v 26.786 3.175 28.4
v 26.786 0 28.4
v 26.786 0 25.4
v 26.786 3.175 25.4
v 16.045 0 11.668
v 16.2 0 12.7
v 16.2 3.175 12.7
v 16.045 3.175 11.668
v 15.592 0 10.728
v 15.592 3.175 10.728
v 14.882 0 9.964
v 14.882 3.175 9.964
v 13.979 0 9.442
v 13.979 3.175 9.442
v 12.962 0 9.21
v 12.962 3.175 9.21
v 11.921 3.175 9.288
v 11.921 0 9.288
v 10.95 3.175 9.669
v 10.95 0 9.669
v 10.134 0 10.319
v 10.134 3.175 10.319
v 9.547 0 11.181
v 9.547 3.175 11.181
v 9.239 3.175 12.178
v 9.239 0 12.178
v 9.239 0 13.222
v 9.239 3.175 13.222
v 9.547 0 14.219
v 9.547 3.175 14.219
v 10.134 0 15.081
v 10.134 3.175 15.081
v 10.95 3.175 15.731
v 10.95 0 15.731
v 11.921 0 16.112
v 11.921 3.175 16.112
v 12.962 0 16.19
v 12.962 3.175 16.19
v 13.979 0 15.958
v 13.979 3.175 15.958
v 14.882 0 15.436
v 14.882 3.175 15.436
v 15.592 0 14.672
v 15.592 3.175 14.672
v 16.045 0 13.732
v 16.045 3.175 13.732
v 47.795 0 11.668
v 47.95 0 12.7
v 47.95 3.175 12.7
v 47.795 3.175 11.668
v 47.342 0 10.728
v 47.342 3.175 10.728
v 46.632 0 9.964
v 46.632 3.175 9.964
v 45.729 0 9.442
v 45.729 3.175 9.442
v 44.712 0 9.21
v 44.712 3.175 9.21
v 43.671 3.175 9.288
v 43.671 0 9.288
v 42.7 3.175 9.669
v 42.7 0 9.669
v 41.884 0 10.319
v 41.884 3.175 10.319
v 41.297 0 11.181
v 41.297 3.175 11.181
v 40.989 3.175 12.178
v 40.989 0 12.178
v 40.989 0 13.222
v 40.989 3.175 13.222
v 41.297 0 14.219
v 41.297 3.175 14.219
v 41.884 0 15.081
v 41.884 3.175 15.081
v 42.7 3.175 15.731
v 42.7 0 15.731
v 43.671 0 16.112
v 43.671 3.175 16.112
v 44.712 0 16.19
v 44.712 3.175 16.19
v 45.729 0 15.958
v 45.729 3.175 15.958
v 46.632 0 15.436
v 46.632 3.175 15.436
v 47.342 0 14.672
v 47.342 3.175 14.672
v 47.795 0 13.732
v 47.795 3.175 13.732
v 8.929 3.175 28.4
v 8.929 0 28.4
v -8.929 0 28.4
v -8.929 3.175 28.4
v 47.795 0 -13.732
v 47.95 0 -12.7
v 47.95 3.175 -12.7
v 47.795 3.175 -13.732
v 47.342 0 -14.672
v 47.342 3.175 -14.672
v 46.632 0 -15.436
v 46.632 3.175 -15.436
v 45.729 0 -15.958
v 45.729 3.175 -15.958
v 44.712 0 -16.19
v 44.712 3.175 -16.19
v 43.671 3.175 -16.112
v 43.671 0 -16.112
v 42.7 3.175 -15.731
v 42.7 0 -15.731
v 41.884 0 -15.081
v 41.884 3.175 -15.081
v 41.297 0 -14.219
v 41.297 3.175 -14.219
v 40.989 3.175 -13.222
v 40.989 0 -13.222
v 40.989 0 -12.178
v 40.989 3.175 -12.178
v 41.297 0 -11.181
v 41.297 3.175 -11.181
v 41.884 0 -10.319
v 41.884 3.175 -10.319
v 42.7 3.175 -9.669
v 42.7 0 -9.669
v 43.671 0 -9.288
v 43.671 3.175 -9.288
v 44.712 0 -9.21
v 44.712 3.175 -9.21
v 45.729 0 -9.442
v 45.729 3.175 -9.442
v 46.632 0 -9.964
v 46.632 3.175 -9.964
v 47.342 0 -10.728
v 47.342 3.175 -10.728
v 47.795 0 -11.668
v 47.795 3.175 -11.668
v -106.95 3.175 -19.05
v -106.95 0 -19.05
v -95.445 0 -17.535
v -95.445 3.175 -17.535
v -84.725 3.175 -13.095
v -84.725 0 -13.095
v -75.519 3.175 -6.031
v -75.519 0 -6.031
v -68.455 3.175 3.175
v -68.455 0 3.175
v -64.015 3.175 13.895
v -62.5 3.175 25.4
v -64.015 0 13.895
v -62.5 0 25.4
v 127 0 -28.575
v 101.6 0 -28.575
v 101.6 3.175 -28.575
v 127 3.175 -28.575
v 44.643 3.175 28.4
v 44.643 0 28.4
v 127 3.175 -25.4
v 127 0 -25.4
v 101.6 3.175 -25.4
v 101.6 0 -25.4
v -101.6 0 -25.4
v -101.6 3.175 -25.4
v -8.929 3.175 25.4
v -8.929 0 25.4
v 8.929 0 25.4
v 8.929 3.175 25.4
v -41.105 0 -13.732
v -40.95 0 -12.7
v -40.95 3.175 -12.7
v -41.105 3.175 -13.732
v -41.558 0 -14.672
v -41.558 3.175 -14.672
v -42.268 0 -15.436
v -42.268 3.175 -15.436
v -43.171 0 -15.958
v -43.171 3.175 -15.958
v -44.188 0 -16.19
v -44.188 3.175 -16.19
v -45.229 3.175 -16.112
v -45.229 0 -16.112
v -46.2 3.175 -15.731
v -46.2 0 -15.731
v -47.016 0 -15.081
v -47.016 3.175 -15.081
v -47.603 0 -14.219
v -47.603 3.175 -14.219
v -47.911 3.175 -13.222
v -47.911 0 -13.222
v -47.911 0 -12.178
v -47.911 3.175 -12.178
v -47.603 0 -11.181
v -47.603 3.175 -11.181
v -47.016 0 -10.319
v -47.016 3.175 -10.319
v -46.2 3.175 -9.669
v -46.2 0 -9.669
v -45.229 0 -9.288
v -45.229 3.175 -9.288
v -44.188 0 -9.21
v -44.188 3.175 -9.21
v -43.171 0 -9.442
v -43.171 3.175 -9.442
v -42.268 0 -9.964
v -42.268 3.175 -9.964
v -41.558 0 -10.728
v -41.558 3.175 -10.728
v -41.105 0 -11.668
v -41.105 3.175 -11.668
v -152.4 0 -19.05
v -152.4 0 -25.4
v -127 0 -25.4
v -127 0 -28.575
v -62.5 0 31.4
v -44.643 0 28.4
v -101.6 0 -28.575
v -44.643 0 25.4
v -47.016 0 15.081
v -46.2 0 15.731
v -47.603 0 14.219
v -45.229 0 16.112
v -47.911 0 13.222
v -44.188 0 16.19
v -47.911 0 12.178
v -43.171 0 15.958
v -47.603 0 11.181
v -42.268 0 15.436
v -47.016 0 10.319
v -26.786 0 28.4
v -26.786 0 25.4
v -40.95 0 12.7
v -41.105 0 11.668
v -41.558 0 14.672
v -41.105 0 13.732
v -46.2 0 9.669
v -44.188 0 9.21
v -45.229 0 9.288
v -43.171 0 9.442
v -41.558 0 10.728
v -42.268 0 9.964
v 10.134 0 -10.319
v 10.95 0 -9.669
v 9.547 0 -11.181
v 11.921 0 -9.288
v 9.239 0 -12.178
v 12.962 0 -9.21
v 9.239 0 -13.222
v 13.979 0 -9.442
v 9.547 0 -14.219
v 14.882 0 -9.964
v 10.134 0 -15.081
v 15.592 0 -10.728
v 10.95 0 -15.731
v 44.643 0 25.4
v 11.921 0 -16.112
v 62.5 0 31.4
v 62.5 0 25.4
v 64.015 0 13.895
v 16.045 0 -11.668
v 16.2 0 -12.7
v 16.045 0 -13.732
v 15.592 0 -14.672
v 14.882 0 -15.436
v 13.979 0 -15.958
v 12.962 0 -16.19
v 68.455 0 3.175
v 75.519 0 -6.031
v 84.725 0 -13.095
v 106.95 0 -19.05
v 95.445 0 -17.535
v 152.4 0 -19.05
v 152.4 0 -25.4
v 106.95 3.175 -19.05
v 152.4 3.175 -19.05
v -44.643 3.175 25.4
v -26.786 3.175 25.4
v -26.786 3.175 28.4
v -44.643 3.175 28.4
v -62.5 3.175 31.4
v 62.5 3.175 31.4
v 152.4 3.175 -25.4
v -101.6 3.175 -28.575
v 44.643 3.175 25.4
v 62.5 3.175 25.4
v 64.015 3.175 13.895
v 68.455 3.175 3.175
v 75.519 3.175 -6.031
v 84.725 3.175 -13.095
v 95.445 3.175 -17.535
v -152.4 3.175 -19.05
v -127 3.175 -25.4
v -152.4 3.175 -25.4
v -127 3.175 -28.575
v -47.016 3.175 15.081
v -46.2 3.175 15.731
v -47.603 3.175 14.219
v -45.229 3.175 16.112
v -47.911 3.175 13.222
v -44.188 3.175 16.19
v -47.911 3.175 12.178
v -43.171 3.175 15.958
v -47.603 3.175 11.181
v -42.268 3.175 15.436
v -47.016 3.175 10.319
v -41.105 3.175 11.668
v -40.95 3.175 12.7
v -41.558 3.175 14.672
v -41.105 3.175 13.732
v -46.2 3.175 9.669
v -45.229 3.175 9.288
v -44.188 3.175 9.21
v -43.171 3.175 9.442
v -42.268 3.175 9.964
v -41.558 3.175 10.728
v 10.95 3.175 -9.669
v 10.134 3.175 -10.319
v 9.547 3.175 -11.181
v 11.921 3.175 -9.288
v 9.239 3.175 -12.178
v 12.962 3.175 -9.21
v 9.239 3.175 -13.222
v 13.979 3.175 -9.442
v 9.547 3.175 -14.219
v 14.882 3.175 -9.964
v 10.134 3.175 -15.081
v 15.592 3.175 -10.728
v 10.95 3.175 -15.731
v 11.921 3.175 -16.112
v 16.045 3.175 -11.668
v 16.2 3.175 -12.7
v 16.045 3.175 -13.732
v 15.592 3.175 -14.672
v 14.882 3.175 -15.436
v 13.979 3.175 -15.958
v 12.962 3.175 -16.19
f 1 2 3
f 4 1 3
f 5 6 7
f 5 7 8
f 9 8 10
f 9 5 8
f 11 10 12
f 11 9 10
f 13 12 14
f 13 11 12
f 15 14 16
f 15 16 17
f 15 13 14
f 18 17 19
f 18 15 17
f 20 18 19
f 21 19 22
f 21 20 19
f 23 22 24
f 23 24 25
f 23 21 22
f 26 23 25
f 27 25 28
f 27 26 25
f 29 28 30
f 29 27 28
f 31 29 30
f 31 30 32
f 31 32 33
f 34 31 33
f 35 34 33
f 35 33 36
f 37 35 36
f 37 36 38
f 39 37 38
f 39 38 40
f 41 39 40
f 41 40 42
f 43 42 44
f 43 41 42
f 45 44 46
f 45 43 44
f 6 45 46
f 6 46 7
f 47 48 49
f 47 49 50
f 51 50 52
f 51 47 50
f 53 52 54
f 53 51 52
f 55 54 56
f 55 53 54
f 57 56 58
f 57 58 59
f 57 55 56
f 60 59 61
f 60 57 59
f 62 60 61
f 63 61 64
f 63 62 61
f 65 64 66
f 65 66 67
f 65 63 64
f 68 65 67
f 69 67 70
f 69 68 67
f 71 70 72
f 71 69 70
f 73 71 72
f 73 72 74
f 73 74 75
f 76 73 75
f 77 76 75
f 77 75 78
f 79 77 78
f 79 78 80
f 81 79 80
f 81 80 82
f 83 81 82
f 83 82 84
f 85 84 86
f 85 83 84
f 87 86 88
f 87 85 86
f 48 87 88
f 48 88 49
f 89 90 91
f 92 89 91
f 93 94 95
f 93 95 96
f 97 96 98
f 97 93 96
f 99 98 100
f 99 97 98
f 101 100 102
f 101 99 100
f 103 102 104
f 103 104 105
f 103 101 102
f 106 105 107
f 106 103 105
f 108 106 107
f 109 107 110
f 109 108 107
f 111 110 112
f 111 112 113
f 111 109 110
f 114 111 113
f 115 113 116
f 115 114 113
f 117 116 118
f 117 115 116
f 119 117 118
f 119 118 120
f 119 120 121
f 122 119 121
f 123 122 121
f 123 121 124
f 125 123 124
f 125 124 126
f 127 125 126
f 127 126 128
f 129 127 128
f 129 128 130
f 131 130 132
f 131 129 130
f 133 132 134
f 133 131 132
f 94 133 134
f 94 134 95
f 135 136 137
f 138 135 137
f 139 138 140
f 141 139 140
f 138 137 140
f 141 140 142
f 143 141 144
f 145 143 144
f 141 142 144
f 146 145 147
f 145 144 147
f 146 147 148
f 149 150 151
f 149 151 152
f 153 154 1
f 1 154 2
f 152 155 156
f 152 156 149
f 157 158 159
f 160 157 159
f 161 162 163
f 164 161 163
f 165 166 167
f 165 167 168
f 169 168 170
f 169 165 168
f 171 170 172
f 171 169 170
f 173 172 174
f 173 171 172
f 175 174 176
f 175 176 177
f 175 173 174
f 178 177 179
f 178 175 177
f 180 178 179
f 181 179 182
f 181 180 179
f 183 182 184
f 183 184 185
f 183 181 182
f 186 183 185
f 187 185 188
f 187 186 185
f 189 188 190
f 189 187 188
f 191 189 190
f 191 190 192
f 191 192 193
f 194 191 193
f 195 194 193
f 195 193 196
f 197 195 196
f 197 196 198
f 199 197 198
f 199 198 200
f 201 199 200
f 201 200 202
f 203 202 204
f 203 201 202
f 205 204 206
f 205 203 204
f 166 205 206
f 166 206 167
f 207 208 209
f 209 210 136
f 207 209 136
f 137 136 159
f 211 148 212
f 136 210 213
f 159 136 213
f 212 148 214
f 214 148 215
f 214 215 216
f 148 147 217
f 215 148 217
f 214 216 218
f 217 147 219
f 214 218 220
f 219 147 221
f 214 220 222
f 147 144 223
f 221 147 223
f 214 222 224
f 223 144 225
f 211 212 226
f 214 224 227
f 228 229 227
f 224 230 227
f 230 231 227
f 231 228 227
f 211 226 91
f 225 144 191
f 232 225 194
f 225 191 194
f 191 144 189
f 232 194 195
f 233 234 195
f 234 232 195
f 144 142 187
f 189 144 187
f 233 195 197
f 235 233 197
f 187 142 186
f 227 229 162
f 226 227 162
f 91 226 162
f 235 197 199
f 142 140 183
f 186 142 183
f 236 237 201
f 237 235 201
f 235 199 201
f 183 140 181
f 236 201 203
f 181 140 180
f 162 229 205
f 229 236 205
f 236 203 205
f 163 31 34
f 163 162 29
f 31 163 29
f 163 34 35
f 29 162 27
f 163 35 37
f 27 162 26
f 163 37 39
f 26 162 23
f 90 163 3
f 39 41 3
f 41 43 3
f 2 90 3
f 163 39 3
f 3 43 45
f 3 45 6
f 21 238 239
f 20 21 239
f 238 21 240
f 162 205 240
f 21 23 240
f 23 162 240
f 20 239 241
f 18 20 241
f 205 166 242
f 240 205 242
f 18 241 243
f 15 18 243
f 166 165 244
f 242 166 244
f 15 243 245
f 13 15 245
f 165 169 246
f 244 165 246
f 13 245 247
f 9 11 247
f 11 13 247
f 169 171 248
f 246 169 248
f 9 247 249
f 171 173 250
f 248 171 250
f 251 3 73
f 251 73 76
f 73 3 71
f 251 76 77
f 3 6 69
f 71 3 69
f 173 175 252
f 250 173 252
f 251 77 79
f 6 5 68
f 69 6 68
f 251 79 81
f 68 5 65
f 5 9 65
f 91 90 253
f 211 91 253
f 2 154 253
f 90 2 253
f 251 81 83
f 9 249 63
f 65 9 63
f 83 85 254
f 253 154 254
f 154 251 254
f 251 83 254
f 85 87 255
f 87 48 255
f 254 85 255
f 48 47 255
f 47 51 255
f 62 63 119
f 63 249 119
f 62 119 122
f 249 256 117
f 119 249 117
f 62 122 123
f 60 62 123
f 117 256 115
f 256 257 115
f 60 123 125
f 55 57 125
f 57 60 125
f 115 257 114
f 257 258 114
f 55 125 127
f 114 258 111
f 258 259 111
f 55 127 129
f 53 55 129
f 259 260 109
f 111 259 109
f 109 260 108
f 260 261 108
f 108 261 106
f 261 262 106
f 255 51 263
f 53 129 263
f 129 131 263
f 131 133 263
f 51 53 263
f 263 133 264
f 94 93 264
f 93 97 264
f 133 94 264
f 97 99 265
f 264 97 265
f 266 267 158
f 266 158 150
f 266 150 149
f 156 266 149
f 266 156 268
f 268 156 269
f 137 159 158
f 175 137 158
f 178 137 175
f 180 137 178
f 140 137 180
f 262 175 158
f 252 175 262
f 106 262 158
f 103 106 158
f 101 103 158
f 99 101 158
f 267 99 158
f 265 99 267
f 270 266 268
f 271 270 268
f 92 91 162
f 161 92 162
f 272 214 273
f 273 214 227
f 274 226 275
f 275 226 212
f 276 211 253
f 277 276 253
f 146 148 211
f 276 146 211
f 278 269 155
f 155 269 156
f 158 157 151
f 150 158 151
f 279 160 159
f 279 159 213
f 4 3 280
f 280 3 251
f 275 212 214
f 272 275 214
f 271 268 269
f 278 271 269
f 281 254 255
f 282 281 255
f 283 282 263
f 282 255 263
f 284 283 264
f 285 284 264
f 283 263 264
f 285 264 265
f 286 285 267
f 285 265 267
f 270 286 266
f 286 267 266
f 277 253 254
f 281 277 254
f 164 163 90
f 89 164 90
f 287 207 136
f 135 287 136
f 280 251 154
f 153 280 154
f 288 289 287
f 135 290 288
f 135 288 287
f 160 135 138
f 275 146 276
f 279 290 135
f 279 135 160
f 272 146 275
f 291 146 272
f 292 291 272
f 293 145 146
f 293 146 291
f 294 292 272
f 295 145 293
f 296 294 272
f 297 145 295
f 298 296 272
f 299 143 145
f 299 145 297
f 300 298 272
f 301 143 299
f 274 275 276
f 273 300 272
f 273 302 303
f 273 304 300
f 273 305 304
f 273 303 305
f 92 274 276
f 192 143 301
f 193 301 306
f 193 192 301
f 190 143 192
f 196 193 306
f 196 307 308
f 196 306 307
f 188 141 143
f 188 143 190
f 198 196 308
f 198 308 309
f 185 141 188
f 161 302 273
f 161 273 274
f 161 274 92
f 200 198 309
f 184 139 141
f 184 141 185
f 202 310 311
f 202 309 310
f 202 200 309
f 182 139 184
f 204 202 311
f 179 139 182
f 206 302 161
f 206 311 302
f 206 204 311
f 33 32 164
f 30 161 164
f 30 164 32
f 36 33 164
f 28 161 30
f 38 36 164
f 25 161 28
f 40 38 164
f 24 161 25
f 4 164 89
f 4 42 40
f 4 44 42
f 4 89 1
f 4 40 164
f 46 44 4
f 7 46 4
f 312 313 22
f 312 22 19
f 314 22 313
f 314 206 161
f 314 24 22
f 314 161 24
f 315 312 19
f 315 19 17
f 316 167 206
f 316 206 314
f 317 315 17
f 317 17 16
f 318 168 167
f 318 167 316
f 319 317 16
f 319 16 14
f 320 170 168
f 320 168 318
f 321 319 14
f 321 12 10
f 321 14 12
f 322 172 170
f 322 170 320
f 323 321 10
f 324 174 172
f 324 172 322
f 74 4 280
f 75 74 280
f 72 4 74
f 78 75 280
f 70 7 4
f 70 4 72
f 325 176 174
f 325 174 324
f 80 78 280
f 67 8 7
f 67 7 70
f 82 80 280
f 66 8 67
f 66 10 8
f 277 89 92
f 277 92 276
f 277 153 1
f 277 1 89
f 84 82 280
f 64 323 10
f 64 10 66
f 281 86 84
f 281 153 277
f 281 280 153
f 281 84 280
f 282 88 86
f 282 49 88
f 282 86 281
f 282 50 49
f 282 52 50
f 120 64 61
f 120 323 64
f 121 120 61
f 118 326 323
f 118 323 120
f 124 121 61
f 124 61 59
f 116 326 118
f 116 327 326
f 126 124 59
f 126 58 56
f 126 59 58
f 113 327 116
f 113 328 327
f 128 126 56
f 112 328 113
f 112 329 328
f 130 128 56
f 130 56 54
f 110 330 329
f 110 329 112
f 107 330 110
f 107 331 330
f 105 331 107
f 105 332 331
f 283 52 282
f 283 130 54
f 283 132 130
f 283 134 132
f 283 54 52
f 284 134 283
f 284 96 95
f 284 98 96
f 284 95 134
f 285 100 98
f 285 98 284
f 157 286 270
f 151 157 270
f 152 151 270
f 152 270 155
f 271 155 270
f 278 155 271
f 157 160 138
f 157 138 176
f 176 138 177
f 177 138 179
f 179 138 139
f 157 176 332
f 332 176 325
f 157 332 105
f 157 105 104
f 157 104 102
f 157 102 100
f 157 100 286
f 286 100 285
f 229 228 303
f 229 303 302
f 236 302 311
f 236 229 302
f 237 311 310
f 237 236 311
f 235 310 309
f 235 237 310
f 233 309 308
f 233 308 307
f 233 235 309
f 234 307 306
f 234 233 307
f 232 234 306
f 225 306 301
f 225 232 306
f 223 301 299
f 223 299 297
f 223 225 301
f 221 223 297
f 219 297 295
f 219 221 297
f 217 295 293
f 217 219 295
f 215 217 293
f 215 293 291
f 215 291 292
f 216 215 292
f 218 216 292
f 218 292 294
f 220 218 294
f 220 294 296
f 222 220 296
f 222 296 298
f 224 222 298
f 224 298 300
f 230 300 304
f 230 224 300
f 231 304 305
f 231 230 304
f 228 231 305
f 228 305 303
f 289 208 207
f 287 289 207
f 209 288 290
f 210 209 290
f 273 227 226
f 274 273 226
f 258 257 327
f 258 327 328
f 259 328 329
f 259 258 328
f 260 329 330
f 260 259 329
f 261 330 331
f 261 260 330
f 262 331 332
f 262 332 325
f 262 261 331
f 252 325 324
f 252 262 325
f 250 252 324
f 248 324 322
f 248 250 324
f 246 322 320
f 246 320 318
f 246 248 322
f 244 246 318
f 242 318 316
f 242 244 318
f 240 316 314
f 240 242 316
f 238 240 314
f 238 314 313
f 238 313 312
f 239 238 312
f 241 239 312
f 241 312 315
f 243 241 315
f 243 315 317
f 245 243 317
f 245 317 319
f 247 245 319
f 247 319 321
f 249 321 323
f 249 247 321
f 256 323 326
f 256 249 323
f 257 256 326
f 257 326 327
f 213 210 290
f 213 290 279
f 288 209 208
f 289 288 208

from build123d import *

# Parameters (mm, degrees)
SKETCH1_R           = 3.5
SKETCH1_W           = 25.4
SKETCH1_H           = 3.175
BOSS_EXTRUDE1_DEPTH = 3.175


with BuildPart() as part:
    # Sketch1 → Boss-Extrude1 (new body)
    with BuildSketch(Plane(origin=(0, 0, 0), x_dir=(1, 0, 0), z_dir=(0, 1, 0))):
        with BuildLine():
            Line((-152.4, 19.05), (-106.95, 19.05))
            ThreePointArc((-106.95, 19.05), (-75.519103576, 6.030896424), (-62.5, -25.4))
            Line((-62.5, -25.4), (-44.642857143, -25.4))
            Line((-44.642857143, -25.4), (-26.785714286, -25.4))
            Line((-26.785714286, -25.4), (-8.928571429, -25.4))
            Line((-8.928571429, -25.4), (8.928571429, -25.4))
            Line((8.928571429, -25.4), (26.785714286, -25.4))
            Line((26.785714286, -25.4), (44.642857143, -25.4))
            Line((44.642857143, -25.4), (62.5, -25.4))
            ThreePointArc((62.5, -25.4), (75.519103576, 6.030896424), (106.95, 19.05))
            Line((106.95, 19.05), (152.4, 19.05))
            Line((152.4, 19.05), (152.4, 25.4))
            Line((152.4, 25.4), (127, 25.4))
            Line((127, 25.4), (101.6, 25.4))
            Line((101.6, 25.4), (-101.6, 25.4))
            Line((-101.6, 25.4), (-127, 25.4))
            Line((-127, 25.4), (-152.4, 25.4))
            Line((-152.4, 25.4), (-152.4, 19.05))
        make_face()
        with Locations((-44.45, -12.7)):
            Circle(SKETCH1_R, mode=Mode.SUBTRACT)
        with Locations((12.7, -12.7)):
            Circle(SKETCH1_R, mode=Mode.SUBTRACT)
        with Locations((44.45, -12.7)):
            Circle(SKETCH1_R, mode=Mode.SUBTRACT)
        with Locations((-44.45, 12.7)):
            Circle(SKETCH1_R, mode=Mode.SUBTRACT)
        with Locations((12.7, 12.7)):
            Circle(SKETCH1_R, mode=Mode.SUBTRACT)
        with Locations((44.45, 12.7)):
            Circle(SKETCH1_R, mode=Mode.SUBTRACT)
        Polygon((-44.642857143, -25.4), (-62.5, -25.4), (-62.5, -31.4), (62.5, -31.4), (62.5, -25.4), (44.642857143, -25.4), (44.642857143, -28.4), (26.785714286, -28.4), (26.785714286, -25.4), (8.928571429, -25.4), (8.928571429, -28.4), (-8.928571429, -28.4), (-8.928571429, -25.4), (-26.785714286, -25.4), (-26.785714286, -28.4), (-44.642857143, -28.4), align=None)
        with Locations((-114.3, 26.9875)):
            Rectangle(SKETCH1_W, SKETCH1_H)
        with Locations((114.3, 26.9875)):
            Rectangle(SKETCH1_W, SKETCH1_H)
    extrude(amount=BOSS_EXTRUDE1_DEPTH)


solid = part.part
